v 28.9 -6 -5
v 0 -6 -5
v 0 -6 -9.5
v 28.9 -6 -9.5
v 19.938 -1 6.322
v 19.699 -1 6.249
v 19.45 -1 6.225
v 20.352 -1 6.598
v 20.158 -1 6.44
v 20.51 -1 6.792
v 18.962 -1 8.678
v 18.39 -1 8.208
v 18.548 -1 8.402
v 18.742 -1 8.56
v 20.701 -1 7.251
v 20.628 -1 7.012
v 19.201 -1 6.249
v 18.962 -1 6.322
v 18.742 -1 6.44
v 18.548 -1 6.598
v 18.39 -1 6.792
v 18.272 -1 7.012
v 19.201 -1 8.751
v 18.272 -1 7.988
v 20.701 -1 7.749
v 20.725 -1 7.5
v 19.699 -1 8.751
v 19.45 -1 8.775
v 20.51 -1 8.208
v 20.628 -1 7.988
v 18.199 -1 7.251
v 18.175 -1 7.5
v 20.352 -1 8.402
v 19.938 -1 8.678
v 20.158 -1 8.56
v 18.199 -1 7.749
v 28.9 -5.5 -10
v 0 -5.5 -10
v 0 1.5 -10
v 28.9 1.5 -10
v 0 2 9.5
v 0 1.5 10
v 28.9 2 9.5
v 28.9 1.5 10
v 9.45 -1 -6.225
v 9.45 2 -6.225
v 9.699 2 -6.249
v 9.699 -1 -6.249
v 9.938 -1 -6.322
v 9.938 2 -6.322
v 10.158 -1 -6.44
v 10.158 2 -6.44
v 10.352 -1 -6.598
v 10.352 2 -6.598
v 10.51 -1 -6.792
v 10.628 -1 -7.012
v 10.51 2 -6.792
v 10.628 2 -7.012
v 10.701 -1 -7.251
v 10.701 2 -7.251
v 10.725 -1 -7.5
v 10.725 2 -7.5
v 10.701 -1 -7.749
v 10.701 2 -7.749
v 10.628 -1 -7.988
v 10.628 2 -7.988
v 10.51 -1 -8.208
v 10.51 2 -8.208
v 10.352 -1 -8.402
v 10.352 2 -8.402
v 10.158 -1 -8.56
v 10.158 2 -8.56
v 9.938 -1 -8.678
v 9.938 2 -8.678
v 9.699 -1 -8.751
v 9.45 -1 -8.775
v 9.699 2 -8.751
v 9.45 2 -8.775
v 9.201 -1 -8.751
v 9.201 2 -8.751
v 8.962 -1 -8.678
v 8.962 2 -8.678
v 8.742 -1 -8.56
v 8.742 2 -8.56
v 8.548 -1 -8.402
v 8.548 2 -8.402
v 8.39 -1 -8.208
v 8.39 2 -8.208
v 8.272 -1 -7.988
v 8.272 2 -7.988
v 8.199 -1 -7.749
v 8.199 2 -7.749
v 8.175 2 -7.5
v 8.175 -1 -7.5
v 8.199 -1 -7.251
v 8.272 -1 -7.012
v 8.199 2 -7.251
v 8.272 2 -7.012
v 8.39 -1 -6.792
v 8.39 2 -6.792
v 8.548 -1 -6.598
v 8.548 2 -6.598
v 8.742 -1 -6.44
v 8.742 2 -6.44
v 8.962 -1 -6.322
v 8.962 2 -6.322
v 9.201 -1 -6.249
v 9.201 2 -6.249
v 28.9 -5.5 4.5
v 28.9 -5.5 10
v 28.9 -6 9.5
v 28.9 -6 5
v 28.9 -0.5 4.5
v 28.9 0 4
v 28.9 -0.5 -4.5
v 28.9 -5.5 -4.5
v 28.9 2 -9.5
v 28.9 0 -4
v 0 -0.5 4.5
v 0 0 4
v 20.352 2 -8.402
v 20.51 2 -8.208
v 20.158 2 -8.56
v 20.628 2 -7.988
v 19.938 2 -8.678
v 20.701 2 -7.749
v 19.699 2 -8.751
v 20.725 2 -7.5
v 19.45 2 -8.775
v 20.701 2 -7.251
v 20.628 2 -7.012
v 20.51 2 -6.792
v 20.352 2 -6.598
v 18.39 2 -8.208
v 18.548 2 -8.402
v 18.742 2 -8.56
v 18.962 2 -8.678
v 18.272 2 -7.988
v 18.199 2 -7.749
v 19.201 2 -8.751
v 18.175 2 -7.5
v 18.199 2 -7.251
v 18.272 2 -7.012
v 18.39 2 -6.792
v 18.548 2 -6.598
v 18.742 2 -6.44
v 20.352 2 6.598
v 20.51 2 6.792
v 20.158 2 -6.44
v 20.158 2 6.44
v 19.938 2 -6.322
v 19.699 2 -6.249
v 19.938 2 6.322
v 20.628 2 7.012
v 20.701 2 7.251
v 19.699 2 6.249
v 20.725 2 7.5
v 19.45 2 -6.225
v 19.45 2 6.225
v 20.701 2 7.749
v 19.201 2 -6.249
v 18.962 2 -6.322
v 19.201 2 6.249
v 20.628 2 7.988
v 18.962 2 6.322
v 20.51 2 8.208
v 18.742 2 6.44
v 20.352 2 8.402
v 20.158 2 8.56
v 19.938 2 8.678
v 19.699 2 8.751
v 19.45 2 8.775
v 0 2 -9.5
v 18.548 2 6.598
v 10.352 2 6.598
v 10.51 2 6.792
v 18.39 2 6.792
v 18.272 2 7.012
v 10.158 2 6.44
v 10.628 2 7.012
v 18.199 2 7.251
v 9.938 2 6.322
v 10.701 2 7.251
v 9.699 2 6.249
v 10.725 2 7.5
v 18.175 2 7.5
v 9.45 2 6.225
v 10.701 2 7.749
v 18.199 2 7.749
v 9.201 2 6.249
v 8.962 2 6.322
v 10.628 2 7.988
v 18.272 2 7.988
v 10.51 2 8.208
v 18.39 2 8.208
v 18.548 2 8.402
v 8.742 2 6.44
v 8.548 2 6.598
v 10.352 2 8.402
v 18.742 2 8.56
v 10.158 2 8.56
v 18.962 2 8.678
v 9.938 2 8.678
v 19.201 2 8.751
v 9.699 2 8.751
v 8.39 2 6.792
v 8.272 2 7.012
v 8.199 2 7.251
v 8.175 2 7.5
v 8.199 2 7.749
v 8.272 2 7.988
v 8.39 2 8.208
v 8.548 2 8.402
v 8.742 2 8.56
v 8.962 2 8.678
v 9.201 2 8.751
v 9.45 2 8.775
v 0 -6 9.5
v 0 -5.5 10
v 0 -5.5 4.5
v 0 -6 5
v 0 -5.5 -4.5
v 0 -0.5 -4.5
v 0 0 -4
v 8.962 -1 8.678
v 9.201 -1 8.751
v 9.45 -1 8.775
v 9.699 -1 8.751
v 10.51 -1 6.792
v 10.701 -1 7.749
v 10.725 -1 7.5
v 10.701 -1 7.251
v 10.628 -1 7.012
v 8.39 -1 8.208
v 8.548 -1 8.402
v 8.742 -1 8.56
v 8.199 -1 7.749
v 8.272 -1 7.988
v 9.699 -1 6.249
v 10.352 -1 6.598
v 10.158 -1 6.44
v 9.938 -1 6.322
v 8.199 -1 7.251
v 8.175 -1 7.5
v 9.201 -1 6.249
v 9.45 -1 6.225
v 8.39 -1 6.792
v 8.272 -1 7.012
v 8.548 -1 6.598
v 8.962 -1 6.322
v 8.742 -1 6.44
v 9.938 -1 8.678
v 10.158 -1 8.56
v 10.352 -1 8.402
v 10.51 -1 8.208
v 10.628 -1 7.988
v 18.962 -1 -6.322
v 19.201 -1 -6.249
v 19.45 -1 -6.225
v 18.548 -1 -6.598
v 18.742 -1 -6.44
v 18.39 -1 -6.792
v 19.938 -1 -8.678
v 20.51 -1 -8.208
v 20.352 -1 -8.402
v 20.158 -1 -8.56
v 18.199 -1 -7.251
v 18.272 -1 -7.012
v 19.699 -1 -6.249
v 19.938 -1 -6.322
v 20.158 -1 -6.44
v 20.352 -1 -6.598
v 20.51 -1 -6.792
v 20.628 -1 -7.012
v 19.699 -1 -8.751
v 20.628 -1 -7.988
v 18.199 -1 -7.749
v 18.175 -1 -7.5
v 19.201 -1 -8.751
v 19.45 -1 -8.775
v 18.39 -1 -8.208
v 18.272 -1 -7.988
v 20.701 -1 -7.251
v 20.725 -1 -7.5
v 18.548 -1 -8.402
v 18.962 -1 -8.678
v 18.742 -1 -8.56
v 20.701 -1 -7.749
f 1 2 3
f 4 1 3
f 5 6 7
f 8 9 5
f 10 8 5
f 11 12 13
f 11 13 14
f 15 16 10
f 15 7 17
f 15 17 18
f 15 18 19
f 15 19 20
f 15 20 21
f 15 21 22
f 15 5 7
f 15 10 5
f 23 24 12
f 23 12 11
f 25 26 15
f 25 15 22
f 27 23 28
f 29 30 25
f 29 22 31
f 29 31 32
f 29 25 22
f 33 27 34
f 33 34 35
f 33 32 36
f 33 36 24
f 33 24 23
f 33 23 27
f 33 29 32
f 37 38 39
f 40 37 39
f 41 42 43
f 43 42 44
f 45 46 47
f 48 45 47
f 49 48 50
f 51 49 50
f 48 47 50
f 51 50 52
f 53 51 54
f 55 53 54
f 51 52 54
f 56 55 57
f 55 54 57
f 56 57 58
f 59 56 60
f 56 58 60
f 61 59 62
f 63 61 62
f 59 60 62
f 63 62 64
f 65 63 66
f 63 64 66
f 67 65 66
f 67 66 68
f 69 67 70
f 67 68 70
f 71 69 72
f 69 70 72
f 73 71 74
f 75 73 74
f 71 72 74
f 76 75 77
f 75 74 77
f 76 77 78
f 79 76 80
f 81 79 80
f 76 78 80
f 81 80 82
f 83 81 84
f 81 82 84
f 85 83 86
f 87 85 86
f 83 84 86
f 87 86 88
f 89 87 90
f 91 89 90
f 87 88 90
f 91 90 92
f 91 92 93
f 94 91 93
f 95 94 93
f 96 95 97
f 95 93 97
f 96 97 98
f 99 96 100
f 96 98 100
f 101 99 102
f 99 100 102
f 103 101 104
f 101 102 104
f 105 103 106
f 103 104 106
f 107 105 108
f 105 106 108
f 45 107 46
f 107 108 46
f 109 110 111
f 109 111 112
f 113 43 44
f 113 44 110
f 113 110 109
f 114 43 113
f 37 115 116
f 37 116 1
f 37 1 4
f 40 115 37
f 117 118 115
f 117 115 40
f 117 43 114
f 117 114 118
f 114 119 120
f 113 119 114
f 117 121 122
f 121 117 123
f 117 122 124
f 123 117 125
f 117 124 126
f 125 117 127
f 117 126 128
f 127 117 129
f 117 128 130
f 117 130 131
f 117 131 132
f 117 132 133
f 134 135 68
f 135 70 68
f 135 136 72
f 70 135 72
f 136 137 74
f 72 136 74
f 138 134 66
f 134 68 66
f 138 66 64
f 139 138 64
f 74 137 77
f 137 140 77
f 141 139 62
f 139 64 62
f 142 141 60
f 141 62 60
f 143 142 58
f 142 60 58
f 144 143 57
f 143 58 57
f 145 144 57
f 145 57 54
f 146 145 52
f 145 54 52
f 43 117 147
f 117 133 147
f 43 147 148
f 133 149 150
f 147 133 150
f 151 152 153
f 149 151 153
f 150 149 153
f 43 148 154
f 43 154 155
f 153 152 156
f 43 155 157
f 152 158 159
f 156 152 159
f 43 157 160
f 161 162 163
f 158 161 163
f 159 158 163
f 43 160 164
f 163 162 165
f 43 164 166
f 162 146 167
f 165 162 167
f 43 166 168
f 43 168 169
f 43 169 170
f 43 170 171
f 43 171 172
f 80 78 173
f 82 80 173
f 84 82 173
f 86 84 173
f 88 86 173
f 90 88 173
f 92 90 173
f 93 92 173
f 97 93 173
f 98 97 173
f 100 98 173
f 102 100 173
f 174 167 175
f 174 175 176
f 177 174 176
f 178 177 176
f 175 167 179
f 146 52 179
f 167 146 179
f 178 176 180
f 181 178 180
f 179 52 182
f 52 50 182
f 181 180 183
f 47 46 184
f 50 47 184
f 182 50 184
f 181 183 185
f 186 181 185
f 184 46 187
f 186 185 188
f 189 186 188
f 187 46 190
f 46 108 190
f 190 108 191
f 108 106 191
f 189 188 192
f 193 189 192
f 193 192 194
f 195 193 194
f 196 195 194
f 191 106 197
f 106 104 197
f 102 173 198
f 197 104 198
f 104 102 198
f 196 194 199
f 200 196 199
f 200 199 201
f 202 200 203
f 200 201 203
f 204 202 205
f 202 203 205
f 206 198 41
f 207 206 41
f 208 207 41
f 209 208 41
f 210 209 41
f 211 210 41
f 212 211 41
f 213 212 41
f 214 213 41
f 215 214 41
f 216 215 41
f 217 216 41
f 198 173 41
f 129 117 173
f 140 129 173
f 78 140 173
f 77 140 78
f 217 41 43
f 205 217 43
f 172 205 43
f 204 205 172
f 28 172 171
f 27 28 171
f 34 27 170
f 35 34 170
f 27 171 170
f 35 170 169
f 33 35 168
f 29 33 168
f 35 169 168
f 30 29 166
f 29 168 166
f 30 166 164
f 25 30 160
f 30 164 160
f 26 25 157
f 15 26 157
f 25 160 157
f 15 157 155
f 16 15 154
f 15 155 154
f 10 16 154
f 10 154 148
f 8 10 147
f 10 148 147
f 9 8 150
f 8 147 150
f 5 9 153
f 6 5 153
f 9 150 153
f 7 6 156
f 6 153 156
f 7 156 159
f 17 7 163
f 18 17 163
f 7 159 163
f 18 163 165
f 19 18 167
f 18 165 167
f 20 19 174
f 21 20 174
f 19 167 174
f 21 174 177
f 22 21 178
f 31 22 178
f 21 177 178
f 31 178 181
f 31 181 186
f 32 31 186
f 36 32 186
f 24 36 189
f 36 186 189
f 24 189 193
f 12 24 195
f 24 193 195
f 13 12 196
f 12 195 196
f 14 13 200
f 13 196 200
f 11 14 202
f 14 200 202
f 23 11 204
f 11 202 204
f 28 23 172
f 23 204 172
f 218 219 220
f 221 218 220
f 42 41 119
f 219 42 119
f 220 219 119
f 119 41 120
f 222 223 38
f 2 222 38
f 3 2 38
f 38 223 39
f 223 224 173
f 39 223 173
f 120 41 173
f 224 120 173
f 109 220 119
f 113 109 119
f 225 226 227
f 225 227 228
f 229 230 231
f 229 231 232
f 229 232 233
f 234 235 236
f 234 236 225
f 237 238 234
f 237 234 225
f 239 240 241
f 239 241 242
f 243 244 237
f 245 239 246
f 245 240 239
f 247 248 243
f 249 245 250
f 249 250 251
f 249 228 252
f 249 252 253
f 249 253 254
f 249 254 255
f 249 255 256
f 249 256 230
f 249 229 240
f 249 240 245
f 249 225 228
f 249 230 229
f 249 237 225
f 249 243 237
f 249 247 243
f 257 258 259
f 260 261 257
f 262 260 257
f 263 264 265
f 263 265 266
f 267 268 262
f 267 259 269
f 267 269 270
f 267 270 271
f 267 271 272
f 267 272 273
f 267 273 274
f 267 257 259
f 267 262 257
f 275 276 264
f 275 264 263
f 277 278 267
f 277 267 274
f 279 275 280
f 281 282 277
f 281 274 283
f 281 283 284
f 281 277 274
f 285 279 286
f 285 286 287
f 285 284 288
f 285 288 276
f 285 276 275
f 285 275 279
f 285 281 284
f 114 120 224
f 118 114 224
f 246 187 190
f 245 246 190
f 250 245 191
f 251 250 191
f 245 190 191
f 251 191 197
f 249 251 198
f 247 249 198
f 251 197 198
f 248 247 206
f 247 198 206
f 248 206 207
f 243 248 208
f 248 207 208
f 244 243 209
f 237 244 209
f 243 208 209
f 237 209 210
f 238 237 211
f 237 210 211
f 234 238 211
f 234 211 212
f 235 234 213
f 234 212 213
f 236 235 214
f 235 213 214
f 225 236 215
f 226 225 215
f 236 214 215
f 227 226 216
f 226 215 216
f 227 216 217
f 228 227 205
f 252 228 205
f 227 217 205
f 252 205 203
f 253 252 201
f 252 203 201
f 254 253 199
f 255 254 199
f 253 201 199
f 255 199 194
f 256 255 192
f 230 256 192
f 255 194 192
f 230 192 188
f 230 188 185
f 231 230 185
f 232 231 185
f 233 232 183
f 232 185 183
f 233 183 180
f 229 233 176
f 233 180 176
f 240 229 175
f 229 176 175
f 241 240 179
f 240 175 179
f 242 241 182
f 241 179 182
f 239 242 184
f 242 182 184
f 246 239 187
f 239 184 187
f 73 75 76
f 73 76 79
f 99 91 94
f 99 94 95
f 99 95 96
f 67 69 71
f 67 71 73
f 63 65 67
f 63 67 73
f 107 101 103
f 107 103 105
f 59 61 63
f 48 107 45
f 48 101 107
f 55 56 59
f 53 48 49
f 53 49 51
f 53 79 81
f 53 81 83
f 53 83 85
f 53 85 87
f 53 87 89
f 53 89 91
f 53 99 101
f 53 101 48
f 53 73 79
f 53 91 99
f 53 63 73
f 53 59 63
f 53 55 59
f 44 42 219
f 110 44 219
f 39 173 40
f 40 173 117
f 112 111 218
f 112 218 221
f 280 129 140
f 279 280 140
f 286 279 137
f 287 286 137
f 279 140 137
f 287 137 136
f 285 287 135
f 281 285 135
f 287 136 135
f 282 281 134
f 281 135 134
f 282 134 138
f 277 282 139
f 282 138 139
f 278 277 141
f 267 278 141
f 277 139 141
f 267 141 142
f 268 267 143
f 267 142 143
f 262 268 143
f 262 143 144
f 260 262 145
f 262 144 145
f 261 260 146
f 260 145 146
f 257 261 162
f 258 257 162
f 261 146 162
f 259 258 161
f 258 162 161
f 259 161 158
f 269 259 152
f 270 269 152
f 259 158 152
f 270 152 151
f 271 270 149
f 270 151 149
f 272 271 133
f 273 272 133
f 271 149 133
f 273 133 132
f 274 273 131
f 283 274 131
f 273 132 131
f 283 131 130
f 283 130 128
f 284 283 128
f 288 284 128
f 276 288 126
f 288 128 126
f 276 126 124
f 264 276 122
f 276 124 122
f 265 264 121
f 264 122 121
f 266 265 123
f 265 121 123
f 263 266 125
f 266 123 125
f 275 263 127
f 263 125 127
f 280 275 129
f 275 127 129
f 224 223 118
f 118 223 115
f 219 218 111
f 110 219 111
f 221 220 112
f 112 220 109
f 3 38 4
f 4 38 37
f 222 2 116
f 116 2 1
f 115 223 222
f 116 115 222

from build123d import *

# Parameters (mm, degrees)
EXTRUDE_1_DEPTH     = 28.9
CHAMFER_1_SIZE      = 0.5
SKETCH_3_R          = 1.275
CUT_EXTRUDE_2_DEPTH = 3


with BuildPart() as part:
    # 草图2 → 拉伸1 (new body)
    with BuildSketch(Plane(origin=(0, 0, 0), x_dir=(0, 0, -1), z_dir=(1, 0, 0))):
        Polygon((-4.5, 0), (4.5, 0), (4.5, -6), (10, -6), (10, 2), (-10, 2), (-10, -6), (-4.5, -6), align=None)
    extrude(amount=EXTRUDE_1_DEPTH)

    # 倒角1
    chamfer_1_edges = [part.edges().sort_by_distance(p)[0] for p in [
        (14.45, -6, 10),
        (14.45, 2, 10),
        (14.45, 2, -10),
        (14.45, -6, -10),
        (14.45, -6, -4.5),
        (14.45, 0, -4.5),
        (14.45, 0, 4.5),
        (14.45, -6, 4.5),
    ]]
    chamfer(chamfer_1_edges, length=CHAMFER_1_SIZE)

    # 草图3 → 拉伸2 (cut)
    with BuildSketch(Plane(origin=(0, 2, 0), x_dir=(1, 0, 0), z_dir=(0, 1, 0))):
        with Locations(Location((9.45, 7.5, 0), (0, 0, 270))):
            Circle(SKETCH_3_R)
        with Locations(Location((19.45, 7.5, 0), (0, 0, 90))):
            Circle(SKETCH_3_R)
        with Locations(Location((19.45, -7.5, 0), (0, 0, 270))):
            Circle(SKETCH_3_R)
        with Locations(Location((9.45, -7.5, 0), (0, 0, 90))):
            Circle(SKETCH_3_R)
    extrude(amount=-CUT_EXTRUDE_2_DEPTH, mode=Mode.SUBTRACT)


solid = part.part
